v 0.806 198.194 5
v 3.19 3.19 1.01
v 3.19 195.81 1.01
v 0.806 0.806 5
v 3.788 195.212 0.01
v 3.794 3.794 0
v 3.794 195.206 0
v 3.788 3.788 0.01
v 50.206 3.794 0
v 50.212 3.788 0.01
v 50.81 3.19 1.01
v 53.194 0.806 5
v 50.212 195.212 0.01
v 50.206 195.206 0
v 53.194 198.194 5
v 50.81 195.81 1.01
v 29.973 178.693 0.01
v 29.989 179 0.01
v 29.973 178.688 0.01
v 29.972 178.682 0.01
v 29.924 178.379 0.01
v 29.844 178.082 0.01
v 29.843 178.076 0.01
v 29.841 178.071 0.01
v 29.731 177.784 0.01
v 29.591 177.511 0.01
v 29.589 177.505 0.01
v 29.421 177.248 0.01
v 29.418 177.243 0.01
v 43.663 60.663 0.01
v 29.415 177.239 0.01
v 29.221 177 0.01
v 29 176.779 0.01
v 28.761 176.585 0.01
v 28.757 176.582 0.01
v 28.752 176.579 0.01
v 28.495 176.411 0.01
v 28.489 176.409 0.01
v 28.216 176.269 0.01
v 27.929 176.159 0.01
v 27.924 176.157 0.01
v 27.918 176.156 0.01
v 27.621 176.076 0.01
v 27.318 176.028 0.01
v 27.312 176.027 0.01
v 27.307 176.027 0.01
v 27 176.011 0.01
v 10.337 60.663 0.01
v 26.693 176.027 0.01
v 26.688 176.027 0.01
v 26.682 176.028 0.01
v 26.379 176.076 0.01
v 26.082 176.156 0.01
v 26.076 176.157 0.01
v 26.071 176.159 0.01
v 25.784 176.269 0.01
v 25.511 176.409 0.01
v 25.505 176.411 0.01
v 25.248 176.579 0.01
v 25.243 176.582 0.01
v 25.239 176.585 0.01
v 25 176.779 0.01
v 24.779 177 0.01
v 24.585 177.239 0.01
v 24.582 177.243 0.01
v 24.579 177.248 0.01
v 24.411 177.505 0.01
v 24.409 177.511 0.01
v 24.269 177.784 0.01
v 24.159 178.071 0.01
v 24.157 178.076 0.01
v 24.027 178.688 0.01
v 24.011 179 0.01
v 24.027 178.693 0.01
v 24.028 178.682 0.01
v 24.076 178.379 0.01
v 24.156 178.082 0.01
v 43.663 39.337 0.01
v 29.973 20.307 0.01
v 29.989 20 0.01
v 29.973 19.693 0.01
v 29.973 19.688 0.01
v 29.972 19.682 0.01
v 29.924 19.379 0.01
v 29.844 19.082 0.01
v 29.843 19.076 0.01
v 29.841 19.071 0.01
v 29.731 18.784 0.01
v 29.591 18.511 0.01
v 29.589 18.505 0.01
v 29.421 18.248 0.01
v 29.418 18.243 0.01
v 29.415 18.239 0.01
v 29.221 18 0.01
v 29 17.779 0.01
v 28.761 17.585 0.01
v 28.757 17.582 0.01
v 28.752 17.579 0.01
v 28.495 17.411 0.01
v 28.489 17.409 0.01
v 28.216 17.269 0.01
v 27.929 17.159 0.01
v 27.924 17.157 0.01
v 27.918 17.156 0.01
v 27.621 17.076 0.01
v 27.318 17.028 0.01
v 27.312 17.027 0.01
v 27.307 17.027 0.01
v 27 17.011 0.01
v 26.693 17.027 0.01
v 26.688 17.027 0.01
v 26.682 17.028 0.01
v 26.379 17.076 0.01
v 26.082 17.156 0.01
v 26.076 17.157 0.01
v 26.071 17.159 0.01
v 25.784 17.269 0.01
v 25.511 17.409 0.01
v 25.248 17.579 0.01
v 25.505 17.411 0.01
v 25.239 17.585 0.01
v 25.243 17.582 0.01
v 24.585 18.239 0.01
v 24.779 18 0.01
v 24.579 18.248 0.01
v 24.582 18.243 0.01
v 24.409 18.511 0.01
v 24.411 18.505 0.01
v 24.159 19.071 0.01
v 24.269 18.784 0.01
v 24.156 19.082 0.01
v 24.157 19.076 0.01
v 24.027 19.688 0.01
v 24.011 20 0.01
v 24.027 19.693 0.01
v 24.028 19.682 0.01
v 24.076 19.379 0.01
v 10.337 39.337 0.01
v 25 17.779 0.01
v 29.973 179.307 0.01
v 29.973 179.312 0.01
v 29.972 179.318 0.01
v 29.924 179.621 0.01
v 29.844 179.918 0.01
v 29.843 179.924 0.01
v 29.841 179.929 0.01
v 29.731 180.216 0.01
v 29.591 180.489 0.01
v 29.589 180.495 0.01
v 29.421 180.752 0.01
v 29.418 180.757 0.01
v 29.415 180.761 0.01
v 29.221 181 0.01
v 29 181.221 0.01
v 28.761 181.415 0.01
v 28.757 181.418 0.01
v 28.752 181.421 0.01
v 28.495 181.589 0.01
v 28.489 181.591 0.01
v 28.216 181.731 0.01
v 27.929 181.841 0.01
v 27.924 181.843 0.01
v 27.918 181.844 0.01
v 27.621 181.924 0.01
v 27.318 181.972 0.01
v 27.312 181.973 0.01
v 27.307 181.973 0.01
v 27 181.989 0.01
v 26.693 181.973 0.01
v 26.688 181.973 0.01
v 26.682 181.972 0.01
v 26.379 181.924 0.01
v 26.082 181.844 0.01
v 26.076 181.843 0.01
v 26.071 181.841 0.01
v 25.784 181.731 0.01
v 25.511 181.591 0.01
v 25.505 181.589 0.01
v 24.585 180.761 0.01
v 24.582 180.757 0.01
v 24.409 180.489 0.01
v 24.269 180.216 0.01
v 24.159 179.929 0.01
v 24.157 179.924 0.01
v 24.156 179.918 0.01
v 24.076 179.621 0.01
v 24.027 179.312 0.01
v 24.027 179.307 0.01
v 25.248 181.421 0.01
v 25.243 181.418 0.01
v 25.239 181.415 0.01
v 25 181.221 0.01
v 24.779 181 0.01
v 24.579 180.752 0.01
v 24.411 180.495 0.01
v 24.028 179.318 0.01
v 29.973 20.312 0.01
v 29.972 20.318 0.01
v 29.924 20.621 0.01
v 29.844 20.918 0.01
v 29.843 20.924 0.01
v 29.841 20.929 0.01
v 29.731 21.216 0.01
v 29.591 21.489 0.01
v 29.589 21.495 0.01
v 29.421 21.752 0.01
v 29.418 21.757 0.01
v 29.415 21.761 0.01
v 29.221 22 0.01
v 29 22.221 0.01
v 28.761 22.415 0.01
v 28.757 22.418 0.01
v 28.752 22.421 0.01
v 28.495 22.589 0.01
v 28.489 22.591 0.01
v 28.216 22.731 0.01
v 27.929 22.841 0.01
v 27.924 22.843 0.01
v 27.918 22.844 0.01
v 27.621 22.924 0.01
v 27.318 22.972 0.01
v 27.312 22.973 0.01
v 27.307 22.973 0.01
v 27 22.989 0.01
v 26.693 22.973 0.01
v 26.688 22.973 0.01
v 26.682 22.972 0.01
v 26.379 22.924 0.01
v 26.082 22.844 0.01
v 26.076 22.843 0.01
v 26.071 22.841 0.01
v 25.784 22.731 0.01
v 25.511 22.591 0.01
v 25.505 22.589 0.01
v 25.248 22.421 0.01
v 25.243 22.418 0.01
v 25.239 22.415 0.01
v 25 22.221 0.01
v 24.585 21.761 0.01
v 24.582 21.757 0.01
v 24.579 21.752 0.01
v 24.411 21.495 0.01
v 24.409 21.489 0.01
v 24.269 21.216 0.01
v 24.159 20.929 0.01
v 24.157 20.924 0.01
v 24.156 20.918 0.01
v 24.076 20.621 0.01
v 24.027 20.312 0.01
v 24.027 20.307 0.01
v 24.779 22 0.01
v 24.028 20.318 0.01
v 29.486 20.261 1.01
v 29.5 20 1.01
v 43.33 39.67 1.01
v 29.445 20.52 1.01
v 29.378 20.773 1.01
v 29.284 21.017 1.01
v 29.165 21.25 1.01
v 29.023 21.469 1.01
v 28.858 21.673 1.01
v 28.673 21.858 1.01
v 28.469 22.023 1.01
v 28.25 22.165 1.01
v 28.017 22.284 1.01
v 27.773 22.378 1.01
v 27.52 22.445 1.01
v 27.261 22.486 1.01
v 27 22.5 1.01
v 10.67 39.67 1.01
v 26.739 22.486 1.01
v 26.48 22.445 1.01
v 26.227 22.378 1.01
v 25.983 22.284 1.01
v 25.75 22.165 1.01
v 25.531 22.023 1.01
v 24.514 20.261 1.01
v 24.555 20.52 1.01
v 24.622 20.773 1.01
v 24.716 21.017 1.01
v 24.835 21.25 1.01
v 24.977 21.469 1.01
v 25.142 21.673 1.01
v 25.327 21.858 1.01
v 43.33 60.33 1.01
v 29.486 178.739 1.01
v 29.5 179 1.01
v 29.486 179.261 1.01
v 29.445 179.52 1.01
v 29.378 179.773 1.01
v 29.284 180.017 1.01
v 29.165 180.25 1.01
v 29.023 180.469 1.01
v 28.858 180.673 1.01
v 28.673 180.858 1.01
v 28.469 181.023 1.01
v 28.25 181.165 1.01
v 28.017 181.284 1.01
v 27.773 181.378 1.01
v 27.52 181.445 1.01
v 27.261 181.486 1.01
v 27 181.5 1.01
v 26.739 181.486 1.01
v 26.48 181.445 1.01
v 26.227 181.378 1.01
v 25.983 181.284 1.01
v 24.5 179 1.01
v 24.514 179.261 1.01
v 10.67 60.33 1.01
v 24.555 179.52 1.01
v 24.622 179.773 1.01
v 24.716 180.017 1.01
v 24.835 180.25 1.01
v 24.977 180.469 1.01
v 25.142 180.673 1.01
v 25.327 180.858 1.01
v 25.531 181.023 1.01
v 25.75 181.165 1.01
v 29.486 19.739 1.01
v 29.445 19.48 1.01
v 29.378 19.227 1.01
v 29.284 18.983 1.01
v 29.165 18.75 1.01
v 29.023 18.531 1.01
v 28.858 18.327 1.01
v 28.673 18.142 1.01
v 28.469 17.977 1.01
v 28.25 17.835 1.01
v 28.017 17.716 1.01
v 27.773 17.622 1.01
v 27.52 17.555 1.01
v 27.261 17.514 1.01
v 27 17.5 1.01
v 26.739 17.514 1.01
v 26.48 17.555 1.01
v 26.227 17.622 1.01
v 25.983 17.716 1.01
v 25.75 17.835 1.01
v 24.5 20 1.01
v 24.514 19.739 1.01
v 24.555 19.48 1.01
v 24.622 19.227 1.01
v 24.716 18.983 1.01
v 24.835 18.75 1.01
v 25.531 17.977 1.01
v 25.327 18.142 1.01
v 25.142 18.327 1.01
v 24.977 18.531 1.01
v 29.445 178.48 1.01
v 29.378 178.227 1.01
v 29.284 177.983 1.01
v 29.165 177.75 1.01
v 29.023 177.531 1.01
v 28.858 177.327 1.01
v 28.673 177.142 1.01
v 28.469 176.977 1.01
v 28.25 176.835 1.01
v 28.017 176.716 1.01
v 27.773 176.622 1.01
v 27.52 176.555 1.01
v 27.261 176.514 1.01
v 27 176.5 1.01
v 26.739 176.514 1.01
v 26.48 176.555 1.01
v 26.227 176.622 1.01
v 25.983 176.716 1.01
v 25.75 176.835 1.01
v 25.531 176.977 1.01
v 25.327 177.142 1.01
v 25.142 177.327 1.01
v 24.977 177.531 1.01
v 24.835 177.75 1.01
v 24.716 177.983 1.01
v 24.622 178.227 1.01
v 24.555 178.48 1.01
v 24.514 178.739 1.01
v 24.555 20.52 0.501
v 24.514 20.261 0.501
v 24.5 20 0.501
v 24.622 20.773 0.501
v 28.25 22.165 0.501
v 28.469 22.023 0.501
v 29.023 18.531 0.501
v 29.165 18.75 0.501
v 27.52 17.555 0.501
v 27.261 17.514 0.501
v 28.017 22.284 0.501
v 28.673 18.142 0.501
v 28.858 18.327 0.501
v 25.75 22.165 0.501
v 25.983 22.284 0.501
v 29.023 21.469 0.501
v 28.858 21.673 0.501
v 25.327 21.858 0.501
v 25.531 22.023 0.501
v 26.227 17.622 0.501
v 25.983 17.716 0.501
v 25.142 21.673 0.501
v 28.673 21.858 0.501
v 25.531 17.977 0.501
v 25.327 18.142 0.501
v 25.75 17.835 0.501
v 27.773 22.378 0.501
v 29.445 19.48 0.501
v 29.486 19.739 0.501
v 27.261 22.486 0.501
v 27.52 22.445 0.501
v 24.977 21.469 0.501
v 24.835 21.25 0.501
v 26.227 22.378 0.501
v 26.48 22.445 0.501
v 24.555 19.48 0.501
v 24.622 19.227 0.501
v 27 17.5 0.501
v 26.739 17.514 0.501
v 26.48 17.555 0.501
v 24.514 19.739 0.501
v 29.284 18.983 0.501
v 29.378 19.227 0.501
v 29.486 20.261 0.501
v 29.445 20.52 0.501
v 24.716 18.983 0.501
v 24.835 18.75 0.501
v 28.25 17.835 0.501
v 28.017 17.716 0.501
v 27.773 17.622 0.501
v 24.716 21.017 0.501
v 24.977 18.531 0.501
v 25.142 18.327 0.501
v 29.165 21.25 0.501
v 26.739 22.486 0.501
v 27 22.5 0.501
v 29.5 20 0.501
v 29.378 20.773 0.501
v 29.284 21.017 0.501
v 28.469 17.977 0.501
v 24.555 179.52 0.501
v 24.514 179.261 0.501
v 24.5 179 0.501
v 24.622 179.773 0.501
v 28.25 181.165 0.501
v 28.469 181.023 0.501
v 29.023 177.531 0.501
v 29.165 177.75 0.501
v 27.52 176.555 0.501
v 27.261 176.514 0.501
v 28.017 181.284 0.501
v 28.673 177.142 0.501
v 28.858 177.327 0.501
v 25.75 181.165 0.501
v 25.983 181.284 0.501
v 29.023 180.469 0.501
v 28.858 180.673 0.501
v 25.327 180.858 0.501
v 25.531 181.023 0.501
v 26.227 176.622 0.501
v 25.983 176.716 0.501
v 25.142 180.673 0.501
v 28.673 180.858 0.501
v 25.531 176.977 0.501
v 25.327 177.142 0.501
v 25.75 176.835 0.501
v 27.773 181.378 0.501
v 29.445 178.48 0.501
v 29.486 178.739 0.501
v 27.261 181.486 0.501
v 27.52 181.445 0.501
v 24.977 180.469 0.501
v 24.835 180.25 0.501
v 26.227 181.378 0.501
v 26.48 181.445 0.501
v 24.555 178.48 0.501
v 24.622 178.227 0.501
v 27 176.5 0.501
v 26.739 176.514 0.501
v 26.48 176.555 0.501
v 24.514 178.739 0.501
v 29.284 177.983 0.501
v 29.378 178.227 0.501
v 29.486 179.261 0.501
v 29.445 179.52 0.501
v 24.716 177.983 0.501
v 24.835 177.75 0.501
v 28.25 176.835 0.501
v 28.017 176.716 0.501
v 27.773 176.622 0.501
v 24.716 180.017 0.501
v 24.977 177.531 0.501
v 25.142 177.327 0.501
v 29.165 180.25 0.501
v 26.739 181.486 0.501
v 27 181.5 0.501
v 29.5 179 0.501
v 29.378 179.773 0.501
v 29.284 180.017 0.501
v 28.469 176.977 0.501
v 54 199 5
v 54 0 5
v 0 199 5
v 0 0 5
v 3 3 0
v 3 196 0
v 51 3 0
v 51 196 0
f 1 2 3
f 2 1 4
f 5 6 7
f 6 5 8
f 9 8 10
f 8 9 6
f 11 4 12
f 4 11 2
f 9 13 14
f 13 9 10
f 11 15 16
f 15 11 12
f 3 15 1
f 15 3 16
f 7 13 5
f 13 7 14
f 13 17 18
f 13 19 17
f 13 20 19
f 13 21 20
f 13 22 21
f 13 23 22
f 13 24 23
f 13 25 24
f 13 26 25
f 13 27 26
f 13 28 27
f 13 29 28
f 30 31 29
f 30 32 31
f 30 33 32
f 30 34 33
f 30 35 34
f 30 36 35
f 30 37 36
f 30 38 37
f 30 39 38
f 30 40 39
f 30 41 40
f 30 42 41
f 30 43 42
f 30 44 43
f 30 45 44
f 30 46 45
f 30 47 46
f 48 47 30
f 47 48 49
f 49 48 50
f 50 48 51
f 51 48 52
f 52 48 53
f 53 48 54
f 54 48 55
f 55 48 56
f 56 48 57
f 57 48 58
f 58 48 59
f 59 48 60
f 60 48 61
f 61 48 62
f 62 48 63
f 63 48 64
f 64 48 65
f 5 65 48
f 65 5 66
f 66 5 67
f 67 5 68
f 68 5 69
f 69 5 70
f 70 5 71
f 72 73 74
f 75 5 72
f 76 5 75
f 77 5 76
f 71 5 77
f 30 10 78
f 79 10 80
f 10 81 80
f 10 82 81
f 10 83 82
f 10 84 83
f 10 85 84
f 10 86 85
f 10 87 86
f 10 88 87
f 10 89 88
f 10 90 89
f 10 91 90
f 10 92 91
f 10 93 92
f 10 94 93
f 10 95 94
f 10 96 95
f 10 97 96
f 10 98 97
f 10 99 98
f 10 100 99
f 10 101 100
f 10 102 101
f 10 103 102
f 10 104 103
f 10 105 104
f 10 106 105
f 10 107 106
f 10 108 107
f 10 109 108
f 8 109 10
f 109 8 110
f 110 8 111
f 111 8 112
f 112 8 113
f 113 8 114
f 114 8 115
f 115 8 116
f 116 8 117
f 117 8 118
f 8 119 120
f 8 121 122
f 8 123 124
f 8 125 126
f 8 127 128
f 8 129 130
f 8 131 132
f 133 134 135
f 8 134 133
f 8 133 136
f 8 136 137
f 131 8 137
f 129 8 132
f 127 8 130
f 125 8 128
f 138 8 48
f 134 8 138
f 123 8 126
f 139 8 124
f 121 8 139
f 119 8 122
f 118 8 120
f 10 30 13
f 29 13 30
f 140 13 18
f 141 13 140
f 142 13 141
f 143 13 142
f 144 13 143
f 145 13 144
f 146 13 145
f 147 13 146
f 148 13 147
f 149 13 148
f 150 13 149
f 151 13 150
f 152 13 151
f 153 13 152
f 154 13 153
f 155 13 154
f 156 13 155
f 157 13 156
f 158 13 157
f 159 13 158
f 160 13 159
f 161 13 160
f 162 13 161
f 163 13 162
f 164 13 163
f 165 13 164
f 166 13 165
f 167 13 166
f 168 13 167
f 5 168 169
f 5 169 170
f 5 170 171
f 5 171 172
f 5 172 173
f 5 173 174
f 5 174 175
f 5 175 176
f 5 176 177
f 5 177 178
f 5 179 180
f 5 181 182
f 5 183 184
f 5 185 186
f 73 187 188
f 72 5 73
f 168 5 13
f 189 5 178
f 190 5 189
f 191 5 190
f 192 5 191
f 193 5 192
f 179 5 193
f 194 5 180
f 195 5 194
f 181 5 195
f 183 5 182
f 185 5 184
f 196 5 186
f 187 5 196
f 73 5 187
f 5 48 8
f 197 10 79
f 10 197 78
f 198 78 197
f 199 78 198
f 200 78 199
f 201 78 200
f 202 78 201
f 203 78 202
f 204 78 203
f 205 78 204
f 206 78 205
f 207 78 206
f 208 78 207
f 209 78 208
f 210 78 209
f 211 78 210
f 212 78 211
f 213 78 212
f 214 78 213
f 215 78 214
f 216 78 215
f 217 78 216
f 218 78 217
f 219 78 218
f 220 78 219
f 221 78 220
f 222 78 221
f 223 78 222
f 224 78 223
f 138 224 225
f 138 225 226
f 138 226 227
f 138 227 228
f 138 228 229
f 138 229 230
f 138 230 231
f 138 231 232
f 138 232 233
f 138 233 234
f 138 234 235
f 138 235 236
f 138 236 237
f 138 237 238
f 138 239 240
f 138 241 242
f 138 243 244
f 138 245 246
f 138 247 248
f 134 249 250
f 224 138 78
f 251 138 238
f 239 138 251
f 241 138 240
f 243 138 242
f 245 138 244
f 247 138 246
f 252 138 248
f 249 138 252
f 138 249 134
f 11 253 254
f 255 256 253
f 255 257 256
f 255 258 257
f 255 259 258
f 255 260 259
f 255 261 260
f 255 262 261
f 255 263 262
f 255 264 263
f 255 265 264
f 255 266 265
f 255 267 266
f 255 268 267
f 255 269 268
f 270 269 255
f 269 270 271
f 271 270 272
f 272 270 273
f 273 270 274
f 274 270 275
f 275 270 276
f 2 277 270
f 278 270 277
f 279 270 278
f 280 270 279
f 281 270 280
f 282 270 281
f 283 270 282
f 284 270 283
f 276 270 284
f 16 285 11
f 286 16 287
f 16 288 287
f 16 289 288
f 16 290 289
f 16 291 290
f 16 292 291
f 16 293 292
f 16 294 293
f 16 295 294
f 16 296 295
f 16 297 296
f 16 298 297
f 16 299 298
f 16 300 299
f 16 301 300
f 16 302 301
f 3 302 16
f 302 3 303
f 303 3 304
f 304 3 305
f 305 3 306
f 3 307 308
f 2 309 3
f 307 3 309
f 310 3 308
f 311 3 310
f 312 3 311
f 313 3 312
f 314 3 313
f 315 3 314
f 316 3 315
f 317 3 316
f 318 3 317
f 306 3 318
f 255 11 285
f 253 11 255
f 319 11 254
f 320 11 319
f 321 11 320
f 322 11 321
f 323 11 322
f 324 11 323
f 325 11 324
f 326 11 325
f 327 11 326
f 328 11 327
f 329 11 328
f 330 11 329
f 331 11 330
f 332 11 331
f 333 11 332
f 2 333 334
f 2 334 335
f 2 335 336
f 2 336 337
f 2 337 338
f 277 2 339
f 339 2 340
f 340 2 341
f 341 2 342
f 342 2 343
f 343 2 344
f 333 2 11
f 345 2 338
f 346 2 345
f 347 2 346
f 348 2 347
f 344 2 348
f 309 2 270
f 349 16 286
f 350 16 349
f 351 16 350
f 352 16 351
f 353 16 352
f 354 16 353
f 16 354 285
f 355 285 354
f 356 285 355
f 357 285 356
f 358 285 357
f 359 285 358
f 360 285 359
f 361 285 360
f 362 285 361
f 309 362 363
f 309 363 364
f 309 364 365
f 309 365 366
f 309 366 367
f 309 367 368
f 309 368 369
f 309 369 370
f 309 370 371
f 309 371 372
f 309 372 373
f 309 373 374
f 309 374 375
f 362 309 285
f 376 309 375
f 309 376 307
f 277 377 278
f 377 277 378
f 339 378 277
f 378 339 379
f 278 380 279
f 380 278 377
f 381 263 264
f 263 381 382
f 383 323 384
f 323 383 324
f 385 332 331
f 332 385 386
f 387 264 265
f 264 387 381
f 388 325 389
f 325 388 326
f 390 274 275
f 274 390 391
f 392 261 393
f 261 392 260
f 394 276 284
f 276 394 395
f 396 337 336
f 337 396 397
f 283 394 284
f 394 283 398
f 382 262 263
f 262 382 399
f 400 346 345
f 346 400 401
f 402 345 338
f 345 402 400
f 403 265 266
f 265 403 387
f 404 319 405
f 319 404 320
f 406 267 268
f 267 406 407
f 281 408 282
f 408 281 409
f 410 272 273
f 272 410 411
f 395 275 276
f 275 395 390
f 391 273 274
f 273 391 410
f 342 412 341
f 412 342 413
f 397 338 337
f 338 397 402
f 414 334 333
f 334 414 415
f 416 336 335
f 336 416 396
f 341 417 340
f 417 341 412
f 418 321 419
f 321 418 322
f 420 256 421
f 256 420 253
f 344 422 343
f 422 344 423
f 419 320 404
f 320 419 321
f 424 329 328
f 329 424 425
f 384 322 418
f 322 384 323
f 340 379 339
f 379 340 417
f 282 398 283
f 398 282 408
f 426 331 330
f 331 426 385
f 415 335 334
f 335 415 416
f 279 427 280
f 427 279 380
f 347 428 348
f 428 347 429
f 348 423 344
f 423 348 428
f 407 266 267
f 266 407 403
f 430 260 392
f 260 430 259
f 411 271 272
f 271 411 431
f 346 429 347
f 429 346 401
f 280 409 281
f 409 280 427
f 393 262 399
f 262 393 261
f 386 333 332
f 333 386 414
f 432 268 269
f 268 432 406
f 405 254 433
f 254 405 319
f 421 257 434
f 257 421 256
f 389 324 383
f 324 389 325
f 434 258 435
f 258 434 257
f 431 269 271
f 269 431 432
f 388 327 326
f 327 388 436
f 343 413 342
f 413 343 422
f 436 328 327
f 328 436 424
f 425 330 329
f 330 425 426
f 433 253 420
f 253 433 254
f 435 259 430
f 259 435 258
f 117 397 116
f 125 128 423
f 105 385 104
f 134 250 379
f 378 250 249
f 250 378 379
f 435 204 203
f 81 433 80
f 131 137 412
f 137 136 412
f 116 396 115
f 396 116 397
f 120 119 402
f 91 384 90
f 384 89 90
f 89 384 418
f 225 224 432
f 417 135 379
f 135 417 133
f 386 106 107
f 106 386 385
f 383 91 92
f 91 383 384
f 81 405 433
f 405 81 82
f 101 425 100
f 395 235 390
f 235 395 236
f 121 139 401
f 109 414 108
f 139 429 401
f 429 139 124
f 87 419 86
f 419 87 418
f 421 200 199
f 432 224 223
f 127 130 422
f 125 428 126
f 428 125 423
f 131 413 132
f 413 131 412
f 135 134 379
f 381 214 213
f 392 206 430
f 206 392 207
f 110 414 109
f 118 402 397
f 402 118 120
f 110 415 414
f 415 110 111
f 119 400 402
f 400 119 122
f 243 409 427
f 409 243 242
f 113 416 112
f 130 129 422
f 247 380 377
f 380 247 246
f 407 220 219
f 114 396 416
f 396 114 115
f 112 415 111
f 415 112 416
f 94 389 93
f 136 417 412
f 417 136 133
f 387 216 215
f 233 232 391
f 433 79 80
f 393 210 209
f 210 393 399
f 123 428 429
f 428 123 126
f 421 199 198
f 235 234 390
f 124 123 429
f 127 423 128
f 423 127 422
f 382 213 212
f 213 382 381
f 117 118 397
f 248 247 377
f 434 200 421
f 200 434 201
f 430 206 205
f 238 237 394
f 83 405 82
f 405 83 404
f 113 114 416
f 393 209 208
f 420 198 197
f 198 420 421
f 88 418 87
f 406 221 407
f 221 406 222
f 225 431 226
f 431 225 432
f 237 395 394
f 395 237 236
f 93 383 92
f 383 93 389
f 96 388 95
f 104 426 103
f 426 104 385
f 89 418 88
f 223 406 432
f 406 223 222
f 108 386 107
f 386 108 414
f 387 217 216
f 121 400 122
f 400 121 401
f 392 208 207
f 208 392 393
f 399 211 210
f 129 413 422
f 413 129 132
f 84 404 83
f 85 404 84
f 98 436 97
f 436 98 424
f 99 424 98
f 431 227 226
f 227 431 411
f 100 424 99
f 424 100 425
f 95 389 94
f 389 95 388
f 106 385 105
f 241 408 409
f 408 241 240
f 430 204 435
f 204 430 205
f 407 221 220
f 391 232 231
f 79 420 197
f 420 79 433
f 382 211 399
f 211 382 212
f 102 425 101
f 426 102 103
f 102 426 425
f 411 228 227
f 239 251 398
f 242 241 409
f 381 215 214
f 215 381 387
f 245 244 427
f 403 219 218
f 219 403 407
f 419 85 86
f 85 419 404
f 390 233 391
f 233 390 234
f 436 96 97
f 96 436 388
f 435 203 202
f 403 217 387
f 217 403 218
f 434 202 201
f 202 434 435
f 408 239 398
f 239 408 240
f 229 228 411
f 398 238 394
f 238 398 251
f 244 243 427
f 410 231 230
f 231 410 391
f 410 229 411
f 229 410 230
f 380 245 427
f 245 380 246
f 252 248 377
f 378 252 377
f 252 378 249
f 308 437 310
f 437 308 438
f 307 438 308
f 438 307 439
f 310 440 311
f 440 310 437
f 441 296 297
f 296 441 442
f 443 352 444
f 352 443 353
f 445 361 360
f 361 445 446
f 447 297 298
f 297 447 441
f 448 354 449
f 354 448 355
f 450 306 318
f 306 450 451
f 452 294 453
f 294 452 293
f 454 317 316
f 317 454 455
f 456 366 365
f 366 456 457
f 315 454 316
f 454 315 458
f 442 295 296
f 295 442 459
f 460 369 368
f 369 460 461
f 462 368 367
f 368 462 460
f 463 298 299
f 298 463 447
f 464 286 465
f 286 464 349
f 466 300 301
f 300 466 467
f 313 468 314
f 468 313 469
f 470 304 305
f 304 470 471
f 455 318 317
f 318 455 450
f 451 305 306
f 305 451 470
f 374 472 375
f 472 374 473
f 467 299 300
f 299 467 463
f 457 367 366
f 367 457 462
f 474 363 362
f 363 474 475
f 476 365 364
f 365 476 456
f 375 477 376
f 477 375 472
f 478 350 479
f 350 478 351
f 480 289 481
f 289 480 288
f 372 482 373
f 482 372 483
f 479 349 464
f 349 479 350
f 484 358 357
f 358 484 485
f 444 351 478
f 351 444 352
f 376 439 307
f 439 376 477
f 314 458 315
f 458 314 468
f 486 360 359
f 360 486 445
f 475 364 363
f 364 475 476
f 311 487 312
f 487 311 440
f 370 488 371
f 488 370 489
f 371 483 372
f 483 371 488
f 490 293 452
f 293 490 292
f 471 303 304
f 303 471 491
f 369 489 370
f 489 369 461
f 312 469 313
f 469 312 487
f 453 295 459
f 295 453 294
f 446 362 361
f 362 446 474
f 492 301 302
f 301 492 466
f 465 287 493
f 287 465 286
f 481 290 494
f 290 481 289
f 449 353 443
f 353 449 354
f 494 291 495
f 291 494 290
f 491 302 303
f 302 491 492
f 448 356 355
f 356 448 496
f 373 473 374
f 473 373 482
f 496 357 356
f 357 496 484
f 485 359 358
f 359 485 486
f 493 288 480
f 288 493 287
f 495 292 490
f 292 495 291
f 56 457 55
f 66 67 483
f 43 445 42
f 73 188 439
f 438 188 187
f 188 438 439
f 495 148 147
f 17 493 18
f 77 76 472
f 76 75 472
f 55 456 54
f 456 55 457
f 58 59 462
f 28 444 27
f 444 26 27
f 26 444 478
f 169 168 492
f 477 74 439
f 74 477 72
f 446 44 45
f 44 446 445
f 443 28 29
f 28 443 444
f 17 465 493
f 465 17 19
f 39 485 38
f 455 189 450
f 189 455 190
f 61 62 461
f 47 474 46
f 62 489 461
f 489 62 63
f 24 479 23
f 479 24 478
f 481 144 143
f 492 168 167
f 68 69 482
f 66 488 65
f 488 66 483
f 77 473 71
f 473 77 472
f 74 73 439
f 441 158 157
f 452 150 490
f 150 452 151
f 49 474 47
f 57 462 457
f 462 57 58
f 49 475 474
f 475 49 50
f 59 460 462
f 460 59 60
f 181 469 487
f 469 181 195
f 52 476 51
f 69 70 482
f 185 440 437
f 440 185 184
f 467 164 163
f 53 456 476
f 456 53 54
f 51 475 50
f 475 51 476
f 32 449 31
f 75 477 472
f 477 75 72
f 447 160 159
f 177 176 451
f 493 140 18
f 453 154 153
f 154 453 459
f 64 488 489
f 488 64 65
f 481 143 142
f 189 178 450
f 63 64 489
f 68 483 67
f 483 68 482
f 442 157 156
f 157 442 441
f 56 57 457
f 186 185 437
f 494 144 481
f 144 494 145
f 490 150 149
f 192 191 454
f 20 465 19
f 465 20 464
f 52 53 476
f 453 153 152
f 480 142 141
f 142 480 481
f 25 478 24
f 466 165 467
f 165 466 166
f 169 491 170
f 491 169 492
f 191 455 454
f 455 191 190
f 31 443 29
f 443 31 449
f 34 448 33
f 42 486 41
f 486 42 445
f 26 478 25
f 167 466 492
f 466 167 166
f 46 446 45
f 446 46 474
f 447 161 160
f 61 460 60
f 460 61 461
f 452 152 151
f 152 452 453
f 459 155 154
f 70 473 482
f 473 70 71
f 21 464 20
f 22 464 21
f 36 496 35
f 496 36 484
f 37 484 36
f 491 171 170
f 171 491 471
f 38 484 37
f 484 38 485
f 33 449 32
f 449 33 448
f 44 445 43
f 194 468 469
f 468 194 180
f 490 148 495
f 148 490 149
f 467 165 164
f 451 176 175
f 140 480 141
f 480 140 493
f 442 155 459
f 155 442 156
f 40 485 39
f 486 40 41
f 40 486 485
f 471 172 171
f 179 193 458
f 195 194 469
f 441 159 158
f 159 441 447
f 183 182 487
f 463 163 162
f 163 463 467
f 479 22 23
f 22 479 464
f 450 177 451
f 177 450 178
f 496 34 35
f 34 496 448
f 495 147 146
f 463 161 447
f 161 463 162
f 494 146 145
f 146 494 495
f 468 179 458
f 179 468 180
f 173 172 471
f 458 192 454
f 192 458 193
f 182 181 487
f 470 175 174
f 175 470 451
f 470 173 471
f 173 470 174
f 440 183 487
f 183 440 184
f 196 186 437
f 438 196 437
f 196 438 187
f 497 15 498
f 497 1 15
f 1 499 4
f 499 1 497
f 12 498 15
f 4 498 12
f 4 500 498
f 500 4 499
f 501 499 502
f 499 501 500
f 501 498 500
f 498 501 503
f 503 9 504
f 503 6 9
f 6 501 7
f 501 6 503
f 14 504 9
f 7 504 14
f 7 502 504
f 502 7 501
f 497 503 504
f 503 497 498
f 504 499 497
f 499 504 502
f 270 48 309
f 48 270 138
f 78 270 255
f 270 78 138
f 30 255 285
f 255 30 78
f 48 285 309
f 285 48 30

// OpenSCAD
// Width of the cover 
width=54;

// Length of the cover
length=199;

// Height of the cover
height=5;

// The top of the cover is a little bit smaller than the bottom. This results in a slight ramp. This value will be substracted on each side for the top. So: if you set this to 3: the top-width will be width-3-3 and the top-length length-3-3
topFaceInset=3;

// Width of the cutout
cutoutWidth=32;

// Length of the cutout
cutoutLength=20;

// Offset (measured from the width-value)
cutoutOffset=40;

// Diameter for the holes
holeDiameter=5;

// Diameter for the top of the holes (for countersunk screws)
holeTopDiameter=6;

// Offset for the holes from the bottom (from y=0)
holesOffset=20;

// The length from one hole to the other hole. Measured from the center of the holes.
holeToHoleLength=159;

// Width of the border
borderWidth=0.8;

// Width of the top
topWidth=1;

// rotate by 180 degree for better print without supports
rotateForPrint=true;

$fn=60+0;

bottomHoleOffset=holesOffset;
topHoleOffset=bottomHoleOffset+holeToHoleLength;

if (rotateForPrint) {
    translate([width, 0, height])
        rotate([0,180,0])
            cover();
} else {
    cover();
}

module cover() {
    difference() {
            cutPyramid(width,length,height, topFaceInset);
            
            translate([borderWidth, borderWidth, -0.01])
                difference() {
                    cutPyramid(width-2*borderWidth,length-2*borderWidth,height+0.02, topFaceInset);
                    translate([0,0,height-topWidth])
                    cube([width-2*borderWidth,length-2*borderWidth,topWidth]);
                }
        
            translate([width/2-cutoutWidth/2, cutoutOffset, height-topWidth-1])
                cutPyramid(cutoutWidth, cutoutLength, topWidth+2, -1);
            
            hole(width/2, bottomHoleOffset);
            hole(width/2, topHoleOffset);
                
            
        }
}

module hole(x, y) {
    translate([x, y, 0]) {
        cylinder(d=holeDiameter, h=height+2);
        translate([0,0,height-topWidth/2-0.001])
            cylinder(d1=holeDiameter, d2=holeTopDiameter, h=topWidth/2+0.002);
    }
}

module cutPyramid(w, l, h, topInset) {
	polyhedron(points = [
      [  0,  0,  0 ],  //0
      [ w,  0,  0 ],  //1
      [ w,  l,  0 ],  //2
      [  0,  l,  0 ],  //3
      [  0+topInset,  0+topInset,  h ],  //4
      [ w-topInset,  0+topInset,  h ],  //5
      [ w-topInset,  l-topInset,  h ],  //6
      [  0+topInset,  l-topInset,  h ]   //7
	], faces = [
      [0,1,2,3],  // bottom
      [4,5,1,0],  // front
      [7,6,5,4],  // top
      [5,6,2,1],  // right
      [6,7,3,2],  // back
      [7,4,0,3]
	]);
}
